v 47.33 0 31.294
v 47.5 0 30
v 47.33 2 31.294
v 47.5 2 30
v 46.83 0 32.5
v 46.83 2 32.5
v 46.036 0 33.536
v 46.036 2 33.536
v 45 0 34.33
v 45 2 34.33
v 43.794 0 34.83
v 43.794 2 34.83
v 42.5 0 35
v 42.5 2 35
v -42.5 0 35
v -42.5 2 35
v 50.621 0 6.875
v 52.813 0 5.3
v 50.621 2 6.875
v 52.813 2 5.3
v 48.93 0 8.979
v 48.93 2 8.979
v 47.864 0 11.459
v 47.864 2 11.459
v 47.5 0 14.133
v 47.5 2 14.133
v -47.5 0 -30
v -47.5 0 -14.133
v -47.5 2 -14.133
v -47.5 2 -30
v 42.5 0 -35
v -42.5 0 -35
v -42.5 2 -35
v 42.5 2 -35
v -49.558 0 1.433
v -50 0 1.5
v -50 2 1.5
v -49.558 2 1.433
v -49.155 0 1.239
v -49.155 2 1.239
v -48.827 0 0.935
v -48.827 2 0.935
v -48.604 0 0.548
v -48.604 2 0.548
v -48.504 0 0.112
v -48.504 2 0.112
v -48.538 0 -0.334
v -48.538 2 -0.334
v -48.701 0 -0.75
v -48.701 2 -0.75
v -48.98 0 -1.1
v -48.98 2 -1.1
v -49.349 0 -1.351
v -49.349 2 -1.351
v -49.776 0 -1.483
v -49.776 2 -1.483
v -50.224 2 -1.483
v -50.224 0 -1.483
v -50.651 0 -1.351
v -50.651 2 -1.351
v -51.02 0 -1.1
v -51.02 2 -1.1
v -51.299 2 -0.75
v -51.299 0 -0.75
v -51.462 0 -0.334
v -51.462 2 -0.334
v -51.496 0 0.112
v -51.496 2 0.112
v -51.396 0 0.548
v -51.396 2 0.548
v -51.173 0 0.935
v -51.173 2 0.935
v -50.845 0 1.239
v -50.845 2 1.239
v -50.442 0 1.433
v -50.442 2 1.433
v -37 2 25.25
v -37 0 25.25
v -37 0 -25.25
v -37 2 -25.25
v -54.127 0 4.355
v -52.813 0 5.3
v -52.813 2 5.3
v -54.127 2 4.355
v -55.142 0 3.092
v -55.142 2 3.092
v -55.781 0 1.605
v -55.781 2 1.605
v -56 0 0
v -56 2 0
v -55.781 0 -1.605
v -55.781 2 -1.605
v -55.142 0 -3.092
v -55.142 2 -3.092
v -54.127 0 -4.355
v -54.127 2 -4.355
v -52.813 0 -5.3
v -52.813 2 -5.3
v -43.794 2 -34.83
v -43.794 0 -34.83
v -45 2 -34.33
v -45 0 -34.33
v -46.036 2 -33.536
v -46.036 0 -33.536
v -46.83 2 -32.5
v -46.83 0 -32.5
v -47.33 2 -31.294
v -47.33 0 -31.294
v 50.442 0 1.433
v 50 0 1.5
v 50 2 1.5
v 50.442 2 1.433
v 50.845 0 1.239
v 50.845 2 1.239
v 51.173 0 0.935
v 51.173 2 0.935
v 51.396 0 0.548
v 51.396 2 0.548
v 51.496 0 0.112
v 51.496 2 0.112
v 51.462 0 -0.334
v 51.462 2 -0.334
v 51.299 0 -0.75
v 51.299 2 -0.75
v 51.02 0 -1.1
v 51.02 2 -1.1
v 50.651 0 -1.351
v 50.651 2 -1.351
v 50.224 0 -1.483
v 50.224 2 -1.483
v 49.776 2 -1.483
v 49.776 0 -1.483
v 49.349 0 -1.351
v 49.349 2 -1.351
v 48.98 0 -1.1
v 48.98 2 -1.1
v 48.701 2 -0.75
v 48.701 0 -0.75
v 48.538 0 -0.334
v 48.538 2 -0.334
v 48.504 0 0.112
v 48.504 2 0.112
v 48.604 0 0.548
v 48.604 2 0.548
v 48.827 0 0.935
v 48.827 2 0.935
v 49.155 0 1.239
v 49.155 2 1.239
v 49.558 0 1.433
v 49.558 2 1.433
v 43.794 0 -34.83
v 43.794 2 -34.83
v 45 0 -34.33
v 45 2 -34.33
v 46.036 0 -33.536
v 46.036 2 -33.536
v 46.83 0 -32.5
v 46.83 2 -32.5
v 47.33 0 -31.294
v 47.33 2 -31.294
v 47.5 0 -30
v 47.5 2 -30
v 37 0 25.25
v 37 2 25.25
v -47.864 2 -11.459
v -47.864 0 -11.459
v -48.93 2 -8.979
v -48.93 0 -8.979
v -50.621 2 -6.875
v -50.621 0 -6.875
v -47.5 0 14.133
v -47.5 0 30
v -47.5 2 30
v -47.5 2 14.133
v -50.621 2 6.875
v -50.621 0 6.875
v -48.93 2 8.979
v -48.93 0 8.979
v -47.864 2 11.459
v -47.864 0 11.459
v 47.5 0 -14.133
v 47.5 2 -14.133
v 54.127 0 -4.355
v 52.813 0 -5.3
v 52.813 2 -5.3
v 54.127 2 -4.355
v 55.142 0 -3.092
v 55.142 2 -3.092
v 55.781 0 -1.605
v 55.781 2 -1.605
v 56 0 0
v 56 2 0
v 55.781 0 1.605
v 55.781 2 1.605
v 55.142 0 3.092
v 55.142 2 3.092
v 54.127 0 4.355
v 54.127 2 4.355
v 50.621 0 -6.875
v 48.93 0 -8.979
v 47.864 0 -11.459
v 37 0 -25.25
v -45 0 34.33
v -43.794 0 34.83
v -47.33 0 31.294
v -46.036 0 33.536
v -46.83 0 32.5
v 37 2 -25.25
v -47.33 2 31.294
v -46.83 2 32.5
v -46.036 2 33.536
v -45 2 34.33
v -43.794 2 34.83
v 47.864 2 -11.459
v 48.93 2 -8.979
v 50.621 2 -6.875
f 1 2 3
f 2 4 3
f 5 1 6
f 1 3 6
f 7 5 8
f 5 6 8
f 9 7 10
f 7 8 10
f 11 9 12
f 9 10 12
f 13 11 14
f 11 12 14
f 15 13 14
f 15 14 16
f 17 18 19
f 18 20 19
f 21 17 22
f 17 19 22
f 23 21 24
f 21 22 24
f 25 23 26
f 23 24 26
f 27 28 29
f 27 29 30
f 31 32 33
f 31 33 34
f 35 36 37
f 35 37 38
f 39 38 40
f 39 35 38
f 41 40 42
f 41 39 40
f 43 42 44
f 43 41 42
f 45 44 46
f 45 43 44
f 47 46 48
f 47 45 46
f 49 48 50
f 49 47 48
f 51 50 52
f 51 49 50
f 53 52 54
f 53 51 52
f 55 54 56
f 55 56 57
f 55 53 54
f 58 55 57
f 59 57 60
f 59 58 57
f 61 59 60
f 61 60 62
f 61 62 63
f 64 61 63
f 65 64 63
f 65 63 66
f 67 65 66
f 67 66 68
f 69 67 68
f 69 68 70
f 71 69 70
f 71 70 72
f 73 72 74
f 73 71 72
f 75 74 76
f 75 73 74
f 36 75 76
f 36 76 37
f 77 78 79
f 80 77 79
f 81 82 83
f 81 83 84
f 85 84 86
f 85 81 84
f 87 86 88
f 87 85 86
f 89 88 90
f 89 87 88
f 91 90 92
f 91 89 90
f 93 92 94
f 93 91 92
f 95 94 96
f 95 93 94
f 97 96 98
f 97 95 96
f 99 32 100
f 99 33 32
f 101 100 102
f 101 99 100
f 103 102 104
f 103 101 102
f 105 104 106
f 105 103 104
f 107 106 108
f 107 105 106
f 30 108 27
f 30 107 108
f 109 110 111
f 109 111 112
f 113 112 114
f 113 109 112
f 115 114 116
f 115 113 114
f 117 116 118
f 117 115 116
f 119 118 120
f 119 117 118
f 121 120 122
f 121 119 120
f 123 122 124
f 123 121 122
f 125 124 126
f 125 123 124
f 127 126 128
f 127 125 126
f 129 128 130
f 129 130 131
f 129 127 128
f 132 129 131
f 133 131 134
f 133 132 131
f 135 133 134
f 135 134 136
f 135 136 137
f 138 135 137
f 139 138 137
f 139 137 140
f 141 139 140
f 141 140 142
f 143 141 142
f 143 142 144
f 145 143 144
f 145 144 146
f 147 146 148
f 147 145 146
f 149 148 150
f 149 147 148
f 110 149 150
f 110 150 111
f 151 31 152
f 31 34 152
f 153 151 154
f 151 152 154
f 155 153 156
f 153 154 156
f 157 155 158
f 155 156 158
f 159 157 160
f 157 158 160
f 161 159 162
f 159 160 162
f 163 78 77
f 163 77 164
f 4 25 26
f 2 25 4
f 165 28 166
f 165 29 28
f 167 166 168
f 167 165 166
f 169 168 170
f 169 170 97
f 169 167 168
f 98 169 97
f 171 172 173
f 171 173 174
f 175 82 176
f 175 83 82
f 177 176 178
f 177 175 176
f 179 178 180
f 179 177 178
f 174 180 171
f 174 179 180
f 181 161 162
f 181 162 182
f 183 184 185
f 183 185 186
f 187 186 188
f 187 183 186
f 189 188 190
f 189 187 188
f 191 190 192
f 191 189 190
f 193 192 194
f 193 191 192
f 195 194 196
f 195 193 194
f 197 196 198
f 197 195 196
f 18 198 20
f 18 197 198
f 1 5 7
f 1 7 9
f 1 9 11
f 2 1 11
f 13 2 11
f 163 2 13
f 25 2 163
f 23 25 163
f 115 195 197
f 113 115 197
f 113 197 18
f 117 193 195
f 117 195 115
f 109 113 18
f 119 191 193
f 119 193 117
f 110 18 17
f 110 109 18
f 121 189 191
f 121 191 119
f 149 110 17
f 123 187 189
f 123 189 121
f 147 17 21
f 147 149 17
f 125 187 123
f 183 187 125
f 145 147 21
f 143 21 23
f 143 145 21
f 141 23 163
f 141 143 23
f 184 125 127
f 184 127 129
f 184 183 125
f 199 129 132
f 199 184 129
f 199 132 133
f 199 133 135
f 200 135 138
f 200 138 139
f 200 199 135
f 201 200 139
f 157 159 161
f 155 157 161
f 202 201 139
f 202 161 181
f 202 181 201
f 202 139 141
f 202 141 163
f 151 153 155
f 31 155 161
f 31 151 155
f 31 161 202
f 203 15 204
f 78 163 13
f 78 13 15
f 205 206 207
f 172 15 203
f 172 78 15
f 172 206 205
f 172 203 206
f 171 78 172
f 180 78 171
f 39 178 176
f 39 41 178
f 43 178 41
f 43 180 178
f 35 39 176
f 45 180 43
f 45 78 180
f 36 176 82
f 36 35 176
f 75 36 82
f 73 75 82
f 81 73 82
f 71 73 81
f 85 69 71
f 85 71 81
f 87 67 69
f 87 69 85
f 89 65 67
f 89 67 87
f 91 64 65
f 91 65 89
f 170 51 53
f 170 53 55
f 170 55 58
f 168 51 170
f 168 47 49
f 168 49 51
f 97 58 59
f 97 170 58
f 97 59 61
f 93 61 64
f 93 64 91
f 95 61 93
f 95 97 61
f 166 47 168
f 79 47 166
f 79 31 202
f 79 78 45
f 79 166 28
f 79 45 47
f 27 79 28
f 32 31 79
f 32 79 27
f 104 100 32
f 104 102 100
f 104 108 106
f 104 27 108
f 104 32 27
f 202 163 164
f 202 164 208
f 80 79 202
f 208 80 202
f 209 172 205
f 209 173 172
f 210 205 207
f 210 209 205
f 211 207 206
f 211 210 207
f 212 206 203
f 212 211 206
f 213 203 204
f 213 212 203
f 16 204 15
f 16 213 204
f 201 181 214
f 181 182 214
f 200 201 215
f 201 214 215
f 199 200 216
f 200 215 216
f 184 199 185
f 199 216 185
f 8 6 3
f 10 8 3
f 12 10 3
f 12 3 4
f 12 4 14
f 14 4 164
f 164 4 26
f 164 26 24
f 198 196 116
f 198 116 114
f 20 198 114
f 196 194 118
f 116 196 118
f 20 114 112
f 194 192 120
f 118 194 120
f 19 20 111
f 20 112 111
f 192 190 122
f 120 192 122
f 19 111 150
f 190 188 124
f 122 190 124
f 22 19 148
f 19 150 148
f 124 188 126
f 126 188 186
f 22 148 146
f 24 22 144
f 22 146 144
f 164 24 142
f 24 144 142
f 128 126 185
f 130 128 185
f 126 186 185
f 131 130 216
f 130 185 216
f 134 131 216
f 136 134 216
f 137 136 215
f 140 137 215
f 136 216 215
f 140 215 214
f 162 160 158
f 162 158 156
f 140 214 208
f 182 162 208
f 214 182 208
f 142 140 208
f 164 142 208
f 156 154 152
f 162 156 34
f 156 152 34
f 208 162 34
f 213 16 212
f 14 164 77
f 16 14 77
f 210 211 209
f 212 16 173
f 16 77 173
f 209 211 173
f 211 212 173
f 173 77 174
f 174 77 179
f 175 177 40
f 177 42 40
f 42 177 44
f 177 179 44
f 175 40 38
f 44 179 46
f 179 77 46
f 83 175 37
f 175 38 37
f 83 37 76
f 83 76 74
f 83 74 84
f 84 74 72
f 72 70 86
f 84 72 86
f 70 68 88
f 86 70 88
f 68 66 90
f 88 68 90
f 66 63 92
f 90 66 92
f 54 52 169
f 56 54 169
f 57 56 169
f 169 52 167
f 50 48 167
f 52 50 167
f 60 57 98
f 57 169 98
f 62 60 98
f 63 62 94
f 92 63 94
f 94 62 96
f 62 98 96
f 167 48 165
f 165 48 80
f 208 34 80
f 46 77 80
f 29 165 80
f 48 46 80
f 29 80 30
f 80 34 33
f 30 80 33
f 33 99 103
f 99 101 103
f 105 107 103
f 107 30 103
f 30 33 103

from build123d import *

# Parameters (mm, degrees)
SKETCH2_R           = 1.5
SKETCH2_W           = 74
SKETCH2_H           = 50.5
BOSS_EXTRUDE1_DEPTH = 2
FILLET1_R           = 5
FILLET2_R           = 10


with BuildPart() as part:
    # Sketch2 → Boss-Extrude1 (new body)
    with BuildSketch(Plane(origin=(0, 0, 0), x_dir=(1, 0, 0), z_dir=(0, 1, 0))):
        with BuildLine():
            Line((-47.5, 35), (47.5, 35))
            Line((47.5, 35), (47.5, 5.454356057))
            ThreePointArc((47.5, 5.454356057), (56, 0), (47.5, -5.454356057))
            Line((47.5, -5.454356057), (47.5, -35))
            Line((47.5, -35), (-47.5, -35))
            Line((-47.5, -35), (-47.5, -5.454356057))
            ThreePointArc((-47.5, -5.454356057), (-56, 0), (-47.5, 5.454356057))
            Line((-47.5, 5.454356057), (-47.5, 35))
        make_face()
        with Locations(Location((-50, 0, 0), (0, 0, 270))):
            Circle(SKETCH2_R, mode=Mode.SUBTRACT)
        with Locations(Location((50, 0, 0), (0, 0, 270))):
            Circle(SKETCH2_R, mode=Mode.SUBTRACT)
        Rectangle(SKETCH2_W, SKETCH2_H, mode=Mode.SUBTRACT)
    extrude(amount=BOSS_EXTRUDE1_DEPTH)

    # Fillet1
    fillet1_edges = [part.edges().sort_by_distance(p)[0] for p in [
        (-47.5, 1, -35),
        (47.5, 1, -35),
        (47.5, 1, 35),
        (-47.5, 1, 35),
    ]]
    fillet(fillet1_edges, radius=FILLET1_R)

    # Fillet2
    fillet2_edges = [part.edges().sort_by_distance(p)[0] for p in [
        (47.5, 1, -5.454356057),
        (47.5, 1, 5.454356057),
        (-47.5, 1, 5.454356057),
        (-47.5, 1, -5.454356057),
    ]]
    fillet(fillet2_edges, radius=FILLET2_R)


solid = part.part
